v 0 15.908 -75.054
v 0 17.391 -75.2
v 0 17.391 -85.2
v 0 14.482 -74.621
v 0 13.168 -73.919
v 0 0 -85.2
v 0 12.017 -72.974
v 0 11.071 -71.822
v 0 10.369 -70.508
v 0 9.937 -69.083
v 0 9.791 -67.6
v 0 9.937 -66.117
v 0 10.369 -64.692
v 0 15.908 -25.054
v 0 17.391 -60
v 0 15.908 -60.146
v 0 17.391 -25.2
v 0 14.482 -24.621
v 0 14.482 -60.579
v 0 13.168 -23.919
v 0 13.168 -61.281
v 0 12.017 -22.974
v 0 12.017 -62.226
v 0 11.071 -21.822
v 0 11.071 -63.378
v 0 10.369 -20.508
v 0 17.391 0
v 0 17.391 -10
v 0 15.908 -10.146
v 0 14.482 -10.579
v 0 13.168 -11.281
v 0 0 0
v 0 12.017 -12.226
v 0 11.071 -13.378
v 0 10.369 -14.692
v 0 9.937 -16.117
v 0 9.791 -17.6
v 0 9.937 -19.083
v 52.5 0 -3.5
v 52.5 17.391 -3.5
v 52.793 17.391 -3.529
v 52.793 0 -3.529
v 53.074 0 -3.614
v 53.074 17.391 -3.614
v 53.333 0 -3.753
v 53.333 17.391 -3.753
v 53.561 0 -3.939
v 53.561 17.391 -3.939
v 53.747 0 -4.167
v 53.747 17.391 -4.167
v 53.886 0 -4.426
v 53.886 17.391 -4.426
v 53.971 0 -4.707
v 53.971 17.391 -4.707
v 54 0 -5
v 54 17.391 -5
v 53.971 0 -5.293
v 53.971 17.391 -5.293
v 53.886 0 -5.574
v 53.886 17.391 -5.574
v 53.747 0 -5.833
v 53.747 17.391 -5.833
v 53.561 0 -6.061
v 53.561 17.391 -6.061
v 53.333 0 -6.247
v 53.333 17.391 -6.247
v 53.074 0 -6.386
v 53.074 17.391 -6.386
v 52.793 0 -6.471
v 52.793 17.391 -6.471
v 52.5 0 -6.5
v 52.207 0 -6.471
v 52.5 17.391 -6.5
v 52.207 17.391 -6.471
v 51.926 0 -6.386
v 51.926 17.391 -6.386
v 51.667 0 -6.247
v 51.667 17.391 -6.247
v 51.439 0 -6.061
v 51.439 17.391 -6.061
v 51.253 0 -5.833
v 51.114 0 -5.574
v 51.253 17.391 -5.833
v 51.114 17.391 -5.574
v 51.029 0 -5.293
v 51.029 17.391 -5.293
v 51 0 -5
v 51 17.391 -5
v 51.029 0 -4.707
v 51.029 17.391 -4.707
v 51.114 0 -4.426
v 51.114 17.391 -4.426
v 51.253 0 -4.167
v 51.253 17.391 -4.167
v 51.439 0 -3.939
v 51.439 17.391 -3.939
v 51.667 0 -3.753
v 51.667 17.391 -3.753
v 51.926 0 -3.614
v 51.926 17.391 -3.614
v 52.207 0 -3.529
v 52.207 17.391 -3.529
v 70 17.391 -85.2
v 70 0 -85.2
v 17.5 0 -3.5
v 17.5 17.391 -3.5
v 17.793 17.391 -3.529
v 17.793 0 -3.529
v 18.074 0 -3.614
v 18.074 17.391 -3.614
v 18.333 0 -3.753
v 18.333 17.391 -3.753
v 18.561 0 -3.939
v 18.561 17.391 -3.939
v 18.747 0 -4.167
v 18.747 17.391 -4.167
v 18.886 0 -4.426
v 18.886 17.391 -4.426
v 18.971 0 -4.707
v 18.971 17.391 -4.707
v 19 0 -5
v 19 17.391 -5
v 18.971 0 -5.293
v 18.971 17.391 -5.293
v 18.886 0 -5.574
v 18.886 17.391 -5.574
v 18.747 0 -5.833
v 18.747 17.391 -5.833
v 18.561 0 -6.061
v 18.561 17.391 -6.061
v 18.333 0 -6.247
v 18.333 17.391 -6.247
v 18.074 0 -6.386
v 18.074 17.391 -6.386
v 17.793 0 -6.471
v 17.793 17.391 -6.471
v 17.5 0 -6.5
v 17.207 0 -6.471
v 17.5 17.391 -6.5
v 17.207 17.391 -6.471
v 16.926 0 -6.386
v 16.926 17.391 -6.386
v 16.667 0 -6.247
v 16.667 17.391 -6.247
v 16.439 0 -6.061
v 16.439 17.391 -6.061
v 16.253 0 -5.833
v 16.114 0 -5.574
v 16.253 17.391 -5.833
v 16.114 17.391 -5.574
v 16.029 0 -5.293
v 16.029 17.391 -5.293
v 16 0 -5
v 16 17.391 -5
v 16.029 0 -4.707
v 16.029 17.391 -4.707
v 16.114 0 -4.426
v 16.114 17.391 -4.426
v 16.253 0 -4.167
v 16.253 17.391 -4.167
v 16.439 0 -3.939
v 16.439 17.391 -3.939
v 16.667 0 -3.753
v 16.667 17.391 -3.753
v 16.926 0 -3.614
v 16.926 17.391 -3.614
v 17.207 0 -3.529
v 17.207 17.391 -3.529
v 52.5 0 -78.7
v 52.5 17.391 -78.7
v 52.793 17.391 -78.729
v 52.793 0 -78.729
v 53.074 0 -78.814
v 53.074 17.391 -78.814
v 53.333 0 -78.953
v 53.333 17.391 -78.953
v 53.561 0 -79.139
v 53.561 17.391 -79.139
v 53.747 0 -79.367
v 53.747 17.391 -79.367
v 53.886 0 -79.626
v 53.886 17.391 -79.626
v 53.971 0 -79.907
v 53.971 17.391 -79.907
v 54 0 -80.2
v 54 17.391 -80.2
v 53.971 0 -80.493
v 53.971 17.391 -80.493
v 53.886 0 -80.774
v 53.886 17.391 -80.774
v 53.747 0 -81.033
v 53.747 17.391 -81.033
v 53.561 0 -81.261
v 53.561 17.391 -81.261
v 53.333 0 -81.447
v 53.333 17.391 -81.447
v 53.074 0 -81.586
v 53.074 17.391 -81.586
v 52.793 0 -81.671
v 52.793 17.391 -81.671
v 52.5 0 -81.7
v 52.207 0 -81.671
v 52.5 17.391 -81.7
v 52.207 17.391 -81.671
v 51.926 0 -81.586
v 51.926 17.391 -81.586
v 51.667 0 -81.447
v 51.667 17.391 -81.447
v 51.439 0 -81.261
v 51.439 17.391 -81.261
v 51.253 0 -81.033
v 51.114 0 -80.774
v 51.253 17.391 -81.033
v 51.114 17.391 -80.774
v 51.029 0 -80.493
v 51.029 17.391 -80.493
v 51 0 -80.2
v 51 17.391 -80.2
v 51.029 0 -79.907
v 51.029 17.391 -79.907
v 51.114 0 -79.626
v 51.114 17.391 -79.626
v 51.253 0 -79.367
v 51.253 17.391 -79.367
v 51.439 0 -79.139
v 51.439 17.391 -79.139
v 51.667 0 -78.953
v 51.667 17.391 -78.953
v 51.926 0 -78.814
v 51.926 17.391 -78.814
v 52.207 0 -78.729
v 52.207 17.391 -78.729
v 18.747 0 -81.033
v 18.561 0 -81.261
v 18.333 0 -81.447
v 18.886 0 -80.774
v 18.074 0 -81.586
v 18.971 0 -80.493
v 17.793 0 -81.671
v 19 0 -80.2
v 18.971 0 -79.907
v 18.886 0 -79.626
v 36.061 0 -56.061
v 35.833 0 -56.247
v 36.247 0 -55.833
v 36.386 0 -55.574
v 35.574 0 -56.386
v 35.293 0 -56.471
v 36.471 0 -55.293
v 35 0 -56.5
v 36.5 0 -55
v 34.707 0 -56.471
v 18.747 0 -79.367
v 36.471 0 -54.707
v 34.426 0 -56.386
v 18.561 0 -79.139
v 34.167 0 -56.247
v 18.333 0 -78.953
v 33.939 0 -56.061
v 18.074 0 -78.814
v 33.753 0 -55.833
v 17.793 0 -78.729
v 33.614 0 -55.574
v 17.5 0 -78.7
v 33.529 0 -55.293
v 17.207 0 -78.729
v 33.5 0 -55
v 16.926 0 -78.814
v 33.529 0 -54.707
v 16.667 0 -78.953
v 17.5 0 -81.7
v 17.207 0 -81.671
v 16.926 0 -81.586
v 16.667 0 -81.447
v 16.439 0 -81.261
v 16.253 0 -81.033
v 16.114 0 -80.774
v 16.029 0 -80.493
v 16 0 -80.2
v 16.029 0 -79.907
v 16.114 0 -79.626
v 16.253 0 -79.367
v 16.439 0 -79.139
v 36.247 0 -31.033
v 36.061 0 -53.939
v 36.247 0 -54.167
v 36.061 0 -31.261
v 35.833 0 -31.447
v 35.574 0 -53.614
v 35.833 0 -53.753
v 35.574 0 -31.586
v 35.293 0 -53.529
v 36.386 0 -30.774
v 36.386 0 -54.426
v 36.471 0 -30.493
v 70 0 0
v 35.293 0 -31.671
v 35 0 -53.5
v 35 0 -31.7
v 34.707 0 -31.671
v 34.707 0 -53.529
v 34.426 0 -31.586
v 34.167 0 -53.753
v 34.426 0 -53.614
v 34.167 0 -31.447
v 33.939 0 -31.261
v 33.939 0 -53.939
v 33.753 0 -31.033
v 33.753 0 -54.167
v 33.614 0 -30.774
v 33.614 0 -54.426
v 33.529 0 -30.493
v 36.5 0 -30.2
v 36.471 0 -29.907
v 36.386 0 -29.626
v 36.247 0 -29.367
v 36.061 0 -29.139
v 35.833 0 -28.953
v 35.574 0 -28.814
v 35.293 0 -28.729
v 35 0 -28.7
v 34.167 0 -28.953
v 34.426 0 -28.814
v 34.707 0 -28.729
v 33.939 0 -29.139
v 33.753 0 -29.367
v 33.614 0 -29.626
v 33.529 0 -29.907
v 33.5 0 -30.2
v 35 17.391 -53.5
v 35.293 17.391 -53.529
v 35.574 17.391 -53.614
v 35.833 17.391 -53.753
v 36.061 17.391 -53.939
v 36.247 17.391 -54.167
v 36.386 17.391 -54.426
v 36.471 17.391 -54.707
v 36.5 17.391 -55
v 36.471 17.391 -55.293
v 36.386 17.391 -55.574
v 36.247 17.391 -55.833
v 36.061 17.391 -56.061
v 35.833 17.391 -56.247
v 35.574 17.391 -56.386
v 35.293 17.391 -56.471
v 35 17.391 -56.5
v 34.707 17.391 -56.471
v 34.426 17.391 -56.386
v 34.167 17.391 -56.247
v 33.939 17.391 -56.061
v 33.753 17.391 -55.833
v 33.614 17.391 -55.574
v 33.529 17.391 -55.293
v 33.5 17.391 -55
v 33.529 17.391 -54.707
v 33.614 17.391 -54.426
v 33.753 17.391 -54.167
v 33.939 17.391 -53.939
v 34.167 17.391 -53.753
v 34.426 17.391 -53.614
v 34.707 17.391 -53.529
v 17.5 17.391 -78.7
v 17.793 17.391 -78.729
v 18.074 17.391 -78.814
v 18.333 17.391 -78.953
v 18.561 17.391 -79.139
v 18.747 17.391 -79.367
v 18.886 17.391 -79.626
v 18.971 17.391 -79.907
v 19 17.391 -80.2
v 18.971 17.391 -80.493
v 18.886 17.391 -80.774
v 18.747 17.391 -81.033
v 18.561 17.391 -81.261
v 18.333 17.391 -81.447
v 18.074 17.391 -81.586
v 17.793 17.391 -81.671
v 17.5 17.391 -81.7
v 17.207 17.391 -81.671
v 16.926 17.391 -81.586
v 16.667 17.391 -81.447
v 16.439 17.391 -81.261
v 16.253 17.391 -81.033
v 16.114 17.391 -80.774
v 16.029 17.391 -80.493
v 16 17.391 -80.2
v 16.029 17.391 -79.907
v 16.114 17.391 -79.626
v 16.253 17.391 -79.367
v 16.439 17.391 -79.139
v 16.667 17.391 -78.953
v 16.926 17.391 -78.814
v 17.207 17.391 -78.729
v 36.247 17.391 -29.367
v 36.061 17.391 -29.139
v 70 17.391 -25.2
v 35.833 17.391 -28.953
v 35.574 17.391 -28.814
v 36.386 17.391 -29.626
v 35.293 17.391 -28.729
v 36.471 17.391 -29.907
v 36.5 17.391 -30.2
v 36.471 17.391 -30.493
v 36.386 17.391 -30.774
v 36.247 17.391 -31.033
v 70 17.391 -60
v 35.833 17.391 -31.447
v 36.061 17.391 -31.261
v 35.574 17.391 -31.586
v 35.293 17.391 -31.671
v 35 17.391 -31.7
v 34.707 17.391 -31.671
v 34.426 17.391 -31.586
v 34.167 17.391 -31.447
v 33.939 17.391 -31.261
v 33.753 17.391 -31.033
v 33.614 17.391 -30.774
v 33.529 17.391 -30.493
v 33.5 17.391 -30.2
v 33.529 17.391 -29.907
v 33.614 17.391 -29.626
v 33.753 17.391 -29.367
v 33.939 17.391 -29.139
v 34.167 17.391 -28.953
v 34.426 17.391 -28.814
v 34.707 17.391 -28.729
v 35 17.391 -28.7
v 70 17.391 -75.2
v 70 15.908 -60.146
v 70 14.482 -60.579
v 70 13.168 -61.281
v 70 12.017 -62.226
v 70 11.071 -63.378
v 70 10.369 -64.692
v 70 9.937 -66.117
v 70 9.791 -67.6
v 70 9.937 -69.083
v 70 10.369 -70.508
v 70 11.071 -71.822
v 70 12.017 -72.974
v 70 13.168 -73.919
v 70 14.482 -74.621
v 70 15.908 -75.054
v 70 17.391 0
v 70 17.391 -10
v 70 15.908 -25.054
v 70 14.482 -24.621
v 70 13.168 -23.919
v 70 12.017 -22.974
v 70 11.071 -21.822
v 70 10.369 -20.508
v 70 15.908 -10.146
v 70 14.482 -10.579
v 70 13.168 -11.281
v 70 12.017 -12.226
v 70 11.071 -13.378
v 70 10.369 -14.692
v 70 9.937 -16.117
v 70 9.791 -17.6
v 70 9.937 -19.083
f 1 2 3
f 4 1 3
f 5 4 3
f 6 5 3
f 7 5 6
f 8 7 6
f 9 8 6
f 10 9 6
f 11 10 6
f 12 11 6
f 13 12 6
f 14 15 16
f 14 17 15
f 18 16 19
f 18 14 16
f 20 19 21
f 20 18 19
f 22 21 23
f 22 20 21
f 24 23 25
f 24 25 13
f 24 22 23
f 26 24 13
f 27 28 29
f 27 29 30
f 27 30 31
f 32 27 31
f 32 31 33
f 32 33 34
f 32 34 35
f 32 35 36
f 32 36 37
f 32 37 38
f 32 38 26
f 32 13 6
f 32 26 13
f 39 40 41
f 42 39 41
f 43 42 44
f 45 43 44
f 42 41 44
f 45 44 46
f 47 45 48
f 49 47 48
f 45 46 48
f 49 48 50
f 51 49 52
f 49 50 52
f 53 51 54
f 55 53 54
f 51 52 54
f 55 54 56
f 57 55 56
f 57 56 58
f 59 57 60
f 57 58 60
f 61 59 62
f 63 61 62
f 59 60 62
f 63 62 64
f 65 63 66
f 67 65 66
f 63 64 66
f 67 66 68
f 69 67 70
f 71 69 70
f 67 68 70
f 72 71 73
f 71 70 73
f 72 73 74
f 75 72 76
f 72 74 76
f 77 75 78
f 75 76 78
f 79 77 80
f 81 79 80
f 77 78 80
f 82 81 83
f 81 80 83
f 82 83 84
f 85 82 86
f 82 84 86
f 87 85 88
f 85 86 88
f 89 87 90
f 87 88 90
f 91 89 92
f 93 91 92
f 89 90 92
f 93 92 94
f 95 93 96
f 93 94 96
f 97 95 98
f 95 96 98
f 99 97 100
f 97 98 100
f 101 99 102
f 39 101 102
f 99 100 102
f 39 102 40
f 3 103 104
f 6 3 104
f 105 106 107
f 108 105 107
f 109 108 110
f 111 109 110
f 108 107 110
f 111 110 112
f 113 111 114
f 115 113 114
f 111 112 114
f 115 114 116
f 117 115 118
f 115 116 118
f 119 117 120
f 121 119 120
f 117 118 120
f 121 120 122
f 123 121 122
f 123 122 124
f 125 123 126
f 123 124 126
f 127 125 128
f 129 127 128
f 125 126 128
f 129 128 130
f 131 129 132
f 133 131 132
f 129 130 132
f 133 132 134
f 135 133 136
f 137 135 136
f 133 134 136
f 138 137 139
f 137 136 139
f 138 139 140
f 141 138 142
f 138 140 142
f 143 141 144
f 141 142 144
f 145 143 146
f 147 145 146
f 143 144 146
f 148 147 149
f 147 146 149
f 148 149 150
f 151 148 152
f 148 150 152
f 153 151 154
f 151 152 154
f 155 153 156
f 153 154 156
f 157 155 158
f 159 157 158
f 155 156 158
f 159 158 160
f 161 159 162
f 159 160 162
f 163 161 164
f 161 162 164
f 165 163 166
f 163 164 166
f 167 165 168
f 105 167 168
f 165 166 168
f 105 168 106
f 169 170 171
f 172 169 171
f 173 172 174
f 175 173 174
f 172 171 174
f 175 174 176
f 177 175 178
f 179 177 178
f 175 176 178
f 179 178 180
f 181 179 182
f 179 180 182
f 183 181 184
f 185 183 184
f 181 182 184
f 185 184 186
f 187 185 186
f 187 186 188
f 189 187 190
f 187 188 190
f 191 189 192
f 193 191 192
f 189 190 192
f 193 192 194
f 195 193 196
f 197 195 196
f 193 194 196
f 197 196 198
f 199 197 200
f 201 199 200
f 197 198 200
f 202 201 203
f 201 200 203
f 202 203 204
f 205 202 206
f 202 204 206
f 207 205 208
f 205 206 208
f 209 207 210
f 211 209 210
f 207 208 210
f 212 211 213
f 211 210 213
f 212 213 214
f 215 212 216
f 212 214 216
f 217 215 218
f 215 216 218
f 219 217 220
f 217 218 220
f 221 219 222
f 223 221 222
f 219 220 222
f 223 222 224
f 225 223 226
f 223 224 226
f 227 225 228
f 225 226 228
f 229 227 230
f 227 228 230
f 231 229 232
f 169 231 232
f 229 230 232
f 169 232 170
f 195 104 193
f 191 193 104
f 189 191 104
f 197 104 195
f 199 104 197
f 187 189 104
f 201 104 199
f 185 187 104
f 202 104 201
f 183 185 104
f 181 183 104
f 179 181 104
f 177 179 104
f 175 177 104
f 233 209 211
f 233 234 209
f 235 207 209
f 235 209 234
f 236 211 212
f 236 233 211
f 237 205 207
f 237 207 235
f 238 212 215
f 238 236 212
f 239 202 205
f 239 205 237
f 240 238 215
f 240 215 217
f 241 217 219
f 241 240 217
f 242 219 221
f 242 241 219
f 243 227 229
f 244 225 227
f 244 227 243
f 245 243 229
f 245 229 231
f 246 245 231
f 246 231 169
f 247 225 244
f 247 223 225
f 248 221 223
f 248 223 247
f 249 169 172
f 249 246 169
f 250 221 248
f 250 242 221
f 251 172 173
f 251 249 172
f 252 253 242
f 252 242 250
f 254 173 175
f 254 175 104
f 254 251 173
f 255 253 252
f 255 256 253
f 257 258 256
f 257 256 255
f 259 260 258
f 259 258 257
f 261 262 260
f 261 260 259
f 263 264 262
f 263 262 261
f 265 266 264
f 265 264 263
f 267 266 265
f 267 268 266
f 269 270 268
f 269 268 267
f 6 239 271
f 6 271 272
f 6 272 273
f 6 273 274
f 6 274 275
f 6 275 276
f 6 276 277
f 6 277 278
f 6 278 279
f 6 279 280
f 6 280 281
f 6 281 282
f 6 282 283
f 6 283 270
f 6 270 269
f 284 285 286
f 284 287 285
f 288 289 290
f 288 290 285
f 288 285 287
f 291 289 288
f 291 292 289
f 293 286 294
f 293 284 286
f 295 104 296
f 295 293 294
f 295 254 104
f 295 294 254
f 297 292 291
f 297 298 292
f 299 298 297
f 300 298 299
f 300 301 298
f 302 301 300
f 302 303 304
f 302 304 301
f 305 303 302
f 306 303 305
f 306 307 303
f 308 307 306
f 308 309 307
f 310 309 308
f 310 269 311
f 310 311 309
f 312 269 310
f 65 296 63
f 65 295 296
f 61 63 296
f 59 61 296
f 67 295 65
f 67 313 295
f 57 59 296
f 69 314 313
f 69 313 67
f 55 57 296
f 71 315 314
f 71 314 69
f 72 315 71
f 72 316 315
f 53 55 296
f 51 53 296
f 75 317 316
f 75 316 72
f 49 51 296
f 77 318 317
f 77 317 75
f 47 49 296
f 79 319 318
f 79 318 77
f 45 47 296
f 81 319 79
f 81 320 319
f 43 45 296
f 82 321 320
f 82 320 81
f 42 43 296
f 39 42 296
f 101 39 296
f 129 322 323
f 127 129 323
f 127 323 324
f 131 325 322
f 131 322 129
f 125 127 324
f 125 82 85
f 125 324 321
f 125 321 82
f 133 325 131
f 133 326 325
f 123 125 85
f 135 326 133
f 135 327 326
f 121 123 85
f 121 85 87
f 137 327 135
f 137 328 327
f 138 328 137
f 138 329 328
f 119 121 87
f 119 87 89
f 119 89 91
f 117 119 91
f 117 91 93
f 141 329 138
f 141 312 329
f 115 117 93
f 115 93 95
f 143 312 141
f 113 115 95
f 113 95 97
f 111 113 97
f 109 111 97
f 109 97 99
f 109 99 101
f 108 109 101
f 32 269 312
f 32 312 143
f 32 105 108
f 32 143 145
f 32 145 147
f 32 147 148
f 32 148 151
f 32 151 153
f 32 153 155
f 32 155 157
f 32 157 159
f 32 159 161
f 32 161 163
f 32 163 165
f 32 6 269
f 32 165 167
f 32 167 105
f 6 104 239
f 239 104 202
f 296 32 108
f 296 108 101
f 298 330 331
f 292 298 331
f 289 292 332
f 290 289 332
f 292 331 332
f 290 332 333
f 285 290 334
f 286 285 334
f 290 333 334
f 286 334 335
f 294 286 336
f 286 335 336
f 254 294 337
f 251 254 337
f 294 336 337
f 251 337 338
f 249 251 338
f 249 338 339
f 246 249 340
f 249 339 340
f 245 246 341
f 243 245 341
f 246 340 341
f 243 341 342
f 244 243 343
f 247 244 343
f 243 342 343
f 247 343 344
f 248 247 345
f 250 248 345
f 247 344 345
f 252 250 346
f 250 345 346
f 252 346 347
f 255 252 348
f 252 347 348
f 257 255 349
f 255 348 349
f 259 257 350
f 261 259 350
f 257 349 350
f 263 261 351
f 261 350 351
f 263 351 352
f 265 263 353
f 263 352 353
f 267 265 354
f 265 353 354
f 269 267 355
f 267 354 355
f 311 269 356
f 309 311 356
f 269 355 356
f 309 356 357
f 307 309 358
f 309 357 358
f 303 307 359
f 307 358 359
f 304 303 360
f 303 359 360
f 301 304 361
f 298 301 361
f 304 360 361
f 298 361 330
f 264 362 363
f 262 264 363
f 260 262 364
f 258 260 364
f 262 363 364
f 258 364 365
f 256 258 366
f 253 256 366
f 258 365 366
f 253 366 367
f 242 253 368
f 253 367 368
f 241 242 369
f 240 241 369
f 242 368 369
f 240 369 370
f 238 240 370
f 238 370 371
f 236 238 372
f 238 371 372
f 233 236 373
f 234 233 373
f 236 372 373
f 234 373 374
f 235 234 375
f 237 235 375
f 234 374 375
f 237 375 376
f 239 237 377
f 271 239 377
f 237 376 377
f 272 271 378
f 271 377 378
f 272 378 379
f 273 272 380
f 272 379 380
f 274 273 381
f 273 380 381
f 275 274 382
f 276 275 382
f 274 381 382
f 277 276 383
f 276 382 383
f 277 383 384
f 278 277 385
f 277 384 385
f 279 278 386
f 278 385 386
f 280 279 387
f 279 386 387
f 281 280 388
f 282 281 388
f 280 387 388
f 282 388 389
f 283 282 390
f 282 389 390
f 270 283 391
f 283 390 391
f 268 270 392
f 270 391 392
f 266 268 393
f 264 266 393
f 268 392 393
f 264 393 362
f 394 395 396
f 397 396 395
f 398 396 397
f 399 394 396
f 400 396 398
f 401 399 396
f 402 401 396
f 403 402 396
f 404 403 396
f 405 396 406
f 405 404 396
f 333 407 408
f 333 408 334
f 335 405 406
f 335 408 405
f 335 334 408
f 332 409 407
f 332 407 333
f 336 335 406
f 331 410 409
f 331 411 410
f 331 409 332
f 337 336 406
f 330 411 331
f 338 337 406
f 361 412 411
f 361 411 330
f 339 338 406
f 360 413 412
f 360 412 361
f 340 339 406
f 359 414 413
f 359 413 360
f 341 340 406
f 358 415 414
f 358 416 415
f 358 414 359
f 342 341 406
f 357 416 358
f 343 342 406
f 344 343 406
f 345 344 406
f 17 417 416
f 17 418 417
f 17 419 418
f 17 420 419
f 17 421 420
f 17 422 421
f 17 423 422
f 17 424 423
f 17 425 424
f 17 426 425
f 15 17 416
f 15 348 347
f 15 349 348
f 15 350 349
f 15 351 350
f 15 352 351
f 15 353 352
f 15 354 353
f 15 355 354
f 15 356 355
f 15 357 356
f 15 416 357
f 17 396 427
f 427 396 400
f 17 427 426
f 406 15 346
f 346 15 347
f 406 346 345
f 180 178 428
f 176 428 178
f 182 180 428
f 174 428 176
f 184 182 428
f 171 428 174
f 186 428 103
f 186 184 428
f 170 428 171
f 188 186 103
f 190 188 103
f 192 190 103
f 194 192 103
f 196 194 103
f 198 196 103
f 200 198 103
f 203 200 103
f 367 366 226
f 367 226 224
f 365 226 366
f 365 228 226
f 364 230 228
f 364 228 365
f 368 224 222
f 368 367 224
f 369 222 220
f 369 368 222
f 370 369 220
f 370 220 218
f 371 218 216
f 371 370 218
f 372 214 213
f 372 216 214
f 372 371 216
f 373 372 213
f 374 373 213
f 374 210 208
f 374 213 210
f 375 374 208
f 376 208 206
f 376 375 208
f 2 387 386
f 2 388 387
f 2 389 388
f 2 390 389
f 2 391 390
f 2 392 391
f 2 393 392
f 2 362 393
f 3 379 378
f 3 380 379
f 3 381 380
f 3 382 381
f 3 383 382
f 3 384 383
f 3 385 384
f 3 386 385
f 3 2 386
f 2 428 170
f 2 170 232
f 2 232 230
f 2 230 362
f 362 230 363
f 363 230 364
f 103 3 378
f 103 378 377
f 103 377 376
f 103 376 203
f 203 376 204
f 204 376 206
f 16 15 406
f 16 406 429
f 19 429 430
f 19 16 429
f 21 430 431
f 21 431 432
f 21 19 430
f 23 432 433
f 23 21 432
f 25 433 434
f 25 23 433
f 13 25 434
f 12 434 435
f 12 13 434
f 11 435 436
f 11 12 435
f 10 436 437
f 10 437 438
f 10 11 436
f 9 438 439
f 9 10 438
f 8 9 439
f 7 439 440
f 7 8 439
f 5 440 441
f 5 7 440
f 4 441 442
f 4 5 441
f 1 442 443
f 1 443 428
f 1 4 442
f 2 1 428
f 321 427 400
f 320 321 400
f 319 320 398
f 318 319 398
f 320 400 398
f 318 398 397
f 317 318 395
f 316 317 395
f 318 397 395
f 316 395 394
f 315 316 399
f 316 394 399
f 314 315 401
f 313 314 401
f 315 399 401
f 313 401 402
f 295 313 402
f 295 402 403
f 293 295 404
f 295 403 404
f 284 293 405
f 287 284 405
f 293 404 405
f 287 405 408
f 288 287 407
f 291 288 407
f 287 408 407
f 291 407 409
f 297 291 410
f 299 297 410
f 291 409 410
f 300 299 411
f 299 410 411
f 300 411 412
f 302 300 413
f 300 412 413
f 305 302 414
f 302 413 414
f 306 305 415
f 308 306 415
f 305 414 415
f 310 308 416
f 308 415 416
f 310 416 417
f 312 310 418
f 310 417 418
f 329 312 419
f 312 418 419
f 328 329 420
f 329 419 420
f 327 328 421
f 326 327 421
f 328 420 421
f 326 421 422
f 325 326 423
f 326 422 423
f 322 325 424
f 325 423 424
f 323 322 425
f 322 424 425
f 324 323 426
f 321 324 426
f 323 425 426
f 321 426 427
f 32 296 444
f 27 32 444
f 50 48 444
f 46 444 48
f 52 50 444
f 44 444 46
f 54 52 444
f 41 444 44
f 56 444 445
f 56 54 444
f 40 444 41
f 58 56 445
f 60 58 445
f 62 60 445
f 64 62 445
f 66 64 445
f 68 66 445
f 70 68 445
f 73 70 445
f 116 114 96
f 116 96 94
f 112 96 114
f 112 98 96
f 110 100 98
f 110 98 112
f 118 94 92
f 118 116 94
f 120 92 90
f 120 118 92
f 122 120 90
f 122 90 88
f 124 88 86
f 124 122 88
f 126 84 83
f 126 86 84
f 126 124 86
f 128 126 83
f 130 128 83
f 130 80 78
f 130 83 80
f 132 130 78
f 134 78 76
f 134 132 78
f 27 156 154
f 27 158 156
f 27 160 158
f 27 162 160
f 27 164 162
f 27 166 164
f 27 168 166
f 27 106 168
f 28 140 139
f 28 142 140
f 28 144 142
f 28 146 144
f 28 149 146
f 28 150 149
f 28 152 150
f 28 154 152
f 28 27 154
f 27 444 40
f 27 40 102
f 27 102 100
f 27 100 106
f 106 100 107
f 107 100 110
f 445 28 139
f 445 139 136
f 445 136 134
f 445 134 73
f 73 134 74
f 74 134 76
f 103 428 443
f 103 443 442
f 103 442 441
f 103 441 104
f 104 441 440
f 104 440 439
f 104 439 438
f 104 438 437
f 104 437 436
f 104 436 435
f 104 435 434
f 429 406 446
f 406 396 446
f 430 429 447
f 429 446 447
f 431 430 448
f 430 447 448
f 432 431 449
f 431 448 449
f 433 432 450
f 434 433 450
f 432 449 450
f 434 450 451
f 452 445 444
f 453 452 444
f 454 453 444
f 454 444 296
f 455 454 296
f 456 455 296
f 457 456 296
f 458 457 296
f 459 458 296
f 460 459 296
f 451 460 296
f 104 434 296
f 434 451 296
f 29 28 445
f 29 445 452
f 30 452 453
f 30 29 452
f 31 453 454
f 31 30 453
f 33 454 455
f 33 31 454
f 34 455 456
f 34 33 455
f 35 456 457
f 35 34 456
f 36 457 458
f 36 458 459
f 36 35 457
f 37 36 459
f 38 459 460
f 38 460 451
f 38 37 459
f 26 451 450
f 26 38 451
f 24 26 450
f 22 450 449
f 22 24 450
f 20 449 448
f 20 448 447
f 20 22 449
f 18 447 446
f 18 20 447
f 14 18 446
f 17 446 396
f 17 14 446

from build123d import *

# Parameters (mm, degrees)
BOSS_EXTRUDE1_DEPTH = 70
SKETCH2_R           = 1.5
CUT_EXTRUDE1_DEPTH  = 17.390666387


with BuildPart() as part:
    # Sketch1 → Boss-Extrude1 (new body)
    with BuildSketch(Plane.YZ):
        with BuildLine():
            ThreePointArc((17.390666387, -60), (9.790666387, -67.6), (17.390666387, -75.2))
            Line((17.390666387, -75.2), (17.390666387, -85.2))
            Line((17.390666387, -85.2), (0, -85.2))
            Line((0, -85.2), (0, 0))
            Line((0, 0), (17.390666387, 0))
            Line((17.390666387, 0), (17.390666387, -10))
            ThreePointArc((17.390666387, -10), (9.790666387, -17.6), (17.390666387, -25.2))
            Line((17.390666387, -25.2), (17.390666387, -60))
        make_face()
    extrude(amount=BOSS_EXTRUDE1_DEPTH)

    # Sketch2 → Cut-Extrude1 (cut)
    with BuildSketch(Plane(origin=(0, 17.390666387, 0), x_dir=(-1, 0, 0), z_dir=(0, 1, 0))):
        with Locations(Location((-52.5, -5, 0), (0, 0, 90))):
            Circle(SKETCH2_R)
        with Locations(Location((-17.5, -5, 0), (0, 0, 90))):
            Circle(SKETCH2_R)
        with Locations(Location((-52.5, -80.2, 0), (0, 0, 90))):
            Circle(SKETCH2_R)
        with Locations(Location((-17.5, -80.2, 0), (0, 0, 90))):
            Circle(SKETCH2_R)
        with Locations(Location((-35, -30.2, 0), (0, 0, 90))):
            Circle(SKETCH2_R)
        with Locations(Location((-35, -55, 0), (0, 0, 90))):
            Circle(SKETCH2_R)
    extrude(amount=-CUT_EXTRUDE1_DEPTH, mode=Mode.SUBTRACT)


solid = part.part
